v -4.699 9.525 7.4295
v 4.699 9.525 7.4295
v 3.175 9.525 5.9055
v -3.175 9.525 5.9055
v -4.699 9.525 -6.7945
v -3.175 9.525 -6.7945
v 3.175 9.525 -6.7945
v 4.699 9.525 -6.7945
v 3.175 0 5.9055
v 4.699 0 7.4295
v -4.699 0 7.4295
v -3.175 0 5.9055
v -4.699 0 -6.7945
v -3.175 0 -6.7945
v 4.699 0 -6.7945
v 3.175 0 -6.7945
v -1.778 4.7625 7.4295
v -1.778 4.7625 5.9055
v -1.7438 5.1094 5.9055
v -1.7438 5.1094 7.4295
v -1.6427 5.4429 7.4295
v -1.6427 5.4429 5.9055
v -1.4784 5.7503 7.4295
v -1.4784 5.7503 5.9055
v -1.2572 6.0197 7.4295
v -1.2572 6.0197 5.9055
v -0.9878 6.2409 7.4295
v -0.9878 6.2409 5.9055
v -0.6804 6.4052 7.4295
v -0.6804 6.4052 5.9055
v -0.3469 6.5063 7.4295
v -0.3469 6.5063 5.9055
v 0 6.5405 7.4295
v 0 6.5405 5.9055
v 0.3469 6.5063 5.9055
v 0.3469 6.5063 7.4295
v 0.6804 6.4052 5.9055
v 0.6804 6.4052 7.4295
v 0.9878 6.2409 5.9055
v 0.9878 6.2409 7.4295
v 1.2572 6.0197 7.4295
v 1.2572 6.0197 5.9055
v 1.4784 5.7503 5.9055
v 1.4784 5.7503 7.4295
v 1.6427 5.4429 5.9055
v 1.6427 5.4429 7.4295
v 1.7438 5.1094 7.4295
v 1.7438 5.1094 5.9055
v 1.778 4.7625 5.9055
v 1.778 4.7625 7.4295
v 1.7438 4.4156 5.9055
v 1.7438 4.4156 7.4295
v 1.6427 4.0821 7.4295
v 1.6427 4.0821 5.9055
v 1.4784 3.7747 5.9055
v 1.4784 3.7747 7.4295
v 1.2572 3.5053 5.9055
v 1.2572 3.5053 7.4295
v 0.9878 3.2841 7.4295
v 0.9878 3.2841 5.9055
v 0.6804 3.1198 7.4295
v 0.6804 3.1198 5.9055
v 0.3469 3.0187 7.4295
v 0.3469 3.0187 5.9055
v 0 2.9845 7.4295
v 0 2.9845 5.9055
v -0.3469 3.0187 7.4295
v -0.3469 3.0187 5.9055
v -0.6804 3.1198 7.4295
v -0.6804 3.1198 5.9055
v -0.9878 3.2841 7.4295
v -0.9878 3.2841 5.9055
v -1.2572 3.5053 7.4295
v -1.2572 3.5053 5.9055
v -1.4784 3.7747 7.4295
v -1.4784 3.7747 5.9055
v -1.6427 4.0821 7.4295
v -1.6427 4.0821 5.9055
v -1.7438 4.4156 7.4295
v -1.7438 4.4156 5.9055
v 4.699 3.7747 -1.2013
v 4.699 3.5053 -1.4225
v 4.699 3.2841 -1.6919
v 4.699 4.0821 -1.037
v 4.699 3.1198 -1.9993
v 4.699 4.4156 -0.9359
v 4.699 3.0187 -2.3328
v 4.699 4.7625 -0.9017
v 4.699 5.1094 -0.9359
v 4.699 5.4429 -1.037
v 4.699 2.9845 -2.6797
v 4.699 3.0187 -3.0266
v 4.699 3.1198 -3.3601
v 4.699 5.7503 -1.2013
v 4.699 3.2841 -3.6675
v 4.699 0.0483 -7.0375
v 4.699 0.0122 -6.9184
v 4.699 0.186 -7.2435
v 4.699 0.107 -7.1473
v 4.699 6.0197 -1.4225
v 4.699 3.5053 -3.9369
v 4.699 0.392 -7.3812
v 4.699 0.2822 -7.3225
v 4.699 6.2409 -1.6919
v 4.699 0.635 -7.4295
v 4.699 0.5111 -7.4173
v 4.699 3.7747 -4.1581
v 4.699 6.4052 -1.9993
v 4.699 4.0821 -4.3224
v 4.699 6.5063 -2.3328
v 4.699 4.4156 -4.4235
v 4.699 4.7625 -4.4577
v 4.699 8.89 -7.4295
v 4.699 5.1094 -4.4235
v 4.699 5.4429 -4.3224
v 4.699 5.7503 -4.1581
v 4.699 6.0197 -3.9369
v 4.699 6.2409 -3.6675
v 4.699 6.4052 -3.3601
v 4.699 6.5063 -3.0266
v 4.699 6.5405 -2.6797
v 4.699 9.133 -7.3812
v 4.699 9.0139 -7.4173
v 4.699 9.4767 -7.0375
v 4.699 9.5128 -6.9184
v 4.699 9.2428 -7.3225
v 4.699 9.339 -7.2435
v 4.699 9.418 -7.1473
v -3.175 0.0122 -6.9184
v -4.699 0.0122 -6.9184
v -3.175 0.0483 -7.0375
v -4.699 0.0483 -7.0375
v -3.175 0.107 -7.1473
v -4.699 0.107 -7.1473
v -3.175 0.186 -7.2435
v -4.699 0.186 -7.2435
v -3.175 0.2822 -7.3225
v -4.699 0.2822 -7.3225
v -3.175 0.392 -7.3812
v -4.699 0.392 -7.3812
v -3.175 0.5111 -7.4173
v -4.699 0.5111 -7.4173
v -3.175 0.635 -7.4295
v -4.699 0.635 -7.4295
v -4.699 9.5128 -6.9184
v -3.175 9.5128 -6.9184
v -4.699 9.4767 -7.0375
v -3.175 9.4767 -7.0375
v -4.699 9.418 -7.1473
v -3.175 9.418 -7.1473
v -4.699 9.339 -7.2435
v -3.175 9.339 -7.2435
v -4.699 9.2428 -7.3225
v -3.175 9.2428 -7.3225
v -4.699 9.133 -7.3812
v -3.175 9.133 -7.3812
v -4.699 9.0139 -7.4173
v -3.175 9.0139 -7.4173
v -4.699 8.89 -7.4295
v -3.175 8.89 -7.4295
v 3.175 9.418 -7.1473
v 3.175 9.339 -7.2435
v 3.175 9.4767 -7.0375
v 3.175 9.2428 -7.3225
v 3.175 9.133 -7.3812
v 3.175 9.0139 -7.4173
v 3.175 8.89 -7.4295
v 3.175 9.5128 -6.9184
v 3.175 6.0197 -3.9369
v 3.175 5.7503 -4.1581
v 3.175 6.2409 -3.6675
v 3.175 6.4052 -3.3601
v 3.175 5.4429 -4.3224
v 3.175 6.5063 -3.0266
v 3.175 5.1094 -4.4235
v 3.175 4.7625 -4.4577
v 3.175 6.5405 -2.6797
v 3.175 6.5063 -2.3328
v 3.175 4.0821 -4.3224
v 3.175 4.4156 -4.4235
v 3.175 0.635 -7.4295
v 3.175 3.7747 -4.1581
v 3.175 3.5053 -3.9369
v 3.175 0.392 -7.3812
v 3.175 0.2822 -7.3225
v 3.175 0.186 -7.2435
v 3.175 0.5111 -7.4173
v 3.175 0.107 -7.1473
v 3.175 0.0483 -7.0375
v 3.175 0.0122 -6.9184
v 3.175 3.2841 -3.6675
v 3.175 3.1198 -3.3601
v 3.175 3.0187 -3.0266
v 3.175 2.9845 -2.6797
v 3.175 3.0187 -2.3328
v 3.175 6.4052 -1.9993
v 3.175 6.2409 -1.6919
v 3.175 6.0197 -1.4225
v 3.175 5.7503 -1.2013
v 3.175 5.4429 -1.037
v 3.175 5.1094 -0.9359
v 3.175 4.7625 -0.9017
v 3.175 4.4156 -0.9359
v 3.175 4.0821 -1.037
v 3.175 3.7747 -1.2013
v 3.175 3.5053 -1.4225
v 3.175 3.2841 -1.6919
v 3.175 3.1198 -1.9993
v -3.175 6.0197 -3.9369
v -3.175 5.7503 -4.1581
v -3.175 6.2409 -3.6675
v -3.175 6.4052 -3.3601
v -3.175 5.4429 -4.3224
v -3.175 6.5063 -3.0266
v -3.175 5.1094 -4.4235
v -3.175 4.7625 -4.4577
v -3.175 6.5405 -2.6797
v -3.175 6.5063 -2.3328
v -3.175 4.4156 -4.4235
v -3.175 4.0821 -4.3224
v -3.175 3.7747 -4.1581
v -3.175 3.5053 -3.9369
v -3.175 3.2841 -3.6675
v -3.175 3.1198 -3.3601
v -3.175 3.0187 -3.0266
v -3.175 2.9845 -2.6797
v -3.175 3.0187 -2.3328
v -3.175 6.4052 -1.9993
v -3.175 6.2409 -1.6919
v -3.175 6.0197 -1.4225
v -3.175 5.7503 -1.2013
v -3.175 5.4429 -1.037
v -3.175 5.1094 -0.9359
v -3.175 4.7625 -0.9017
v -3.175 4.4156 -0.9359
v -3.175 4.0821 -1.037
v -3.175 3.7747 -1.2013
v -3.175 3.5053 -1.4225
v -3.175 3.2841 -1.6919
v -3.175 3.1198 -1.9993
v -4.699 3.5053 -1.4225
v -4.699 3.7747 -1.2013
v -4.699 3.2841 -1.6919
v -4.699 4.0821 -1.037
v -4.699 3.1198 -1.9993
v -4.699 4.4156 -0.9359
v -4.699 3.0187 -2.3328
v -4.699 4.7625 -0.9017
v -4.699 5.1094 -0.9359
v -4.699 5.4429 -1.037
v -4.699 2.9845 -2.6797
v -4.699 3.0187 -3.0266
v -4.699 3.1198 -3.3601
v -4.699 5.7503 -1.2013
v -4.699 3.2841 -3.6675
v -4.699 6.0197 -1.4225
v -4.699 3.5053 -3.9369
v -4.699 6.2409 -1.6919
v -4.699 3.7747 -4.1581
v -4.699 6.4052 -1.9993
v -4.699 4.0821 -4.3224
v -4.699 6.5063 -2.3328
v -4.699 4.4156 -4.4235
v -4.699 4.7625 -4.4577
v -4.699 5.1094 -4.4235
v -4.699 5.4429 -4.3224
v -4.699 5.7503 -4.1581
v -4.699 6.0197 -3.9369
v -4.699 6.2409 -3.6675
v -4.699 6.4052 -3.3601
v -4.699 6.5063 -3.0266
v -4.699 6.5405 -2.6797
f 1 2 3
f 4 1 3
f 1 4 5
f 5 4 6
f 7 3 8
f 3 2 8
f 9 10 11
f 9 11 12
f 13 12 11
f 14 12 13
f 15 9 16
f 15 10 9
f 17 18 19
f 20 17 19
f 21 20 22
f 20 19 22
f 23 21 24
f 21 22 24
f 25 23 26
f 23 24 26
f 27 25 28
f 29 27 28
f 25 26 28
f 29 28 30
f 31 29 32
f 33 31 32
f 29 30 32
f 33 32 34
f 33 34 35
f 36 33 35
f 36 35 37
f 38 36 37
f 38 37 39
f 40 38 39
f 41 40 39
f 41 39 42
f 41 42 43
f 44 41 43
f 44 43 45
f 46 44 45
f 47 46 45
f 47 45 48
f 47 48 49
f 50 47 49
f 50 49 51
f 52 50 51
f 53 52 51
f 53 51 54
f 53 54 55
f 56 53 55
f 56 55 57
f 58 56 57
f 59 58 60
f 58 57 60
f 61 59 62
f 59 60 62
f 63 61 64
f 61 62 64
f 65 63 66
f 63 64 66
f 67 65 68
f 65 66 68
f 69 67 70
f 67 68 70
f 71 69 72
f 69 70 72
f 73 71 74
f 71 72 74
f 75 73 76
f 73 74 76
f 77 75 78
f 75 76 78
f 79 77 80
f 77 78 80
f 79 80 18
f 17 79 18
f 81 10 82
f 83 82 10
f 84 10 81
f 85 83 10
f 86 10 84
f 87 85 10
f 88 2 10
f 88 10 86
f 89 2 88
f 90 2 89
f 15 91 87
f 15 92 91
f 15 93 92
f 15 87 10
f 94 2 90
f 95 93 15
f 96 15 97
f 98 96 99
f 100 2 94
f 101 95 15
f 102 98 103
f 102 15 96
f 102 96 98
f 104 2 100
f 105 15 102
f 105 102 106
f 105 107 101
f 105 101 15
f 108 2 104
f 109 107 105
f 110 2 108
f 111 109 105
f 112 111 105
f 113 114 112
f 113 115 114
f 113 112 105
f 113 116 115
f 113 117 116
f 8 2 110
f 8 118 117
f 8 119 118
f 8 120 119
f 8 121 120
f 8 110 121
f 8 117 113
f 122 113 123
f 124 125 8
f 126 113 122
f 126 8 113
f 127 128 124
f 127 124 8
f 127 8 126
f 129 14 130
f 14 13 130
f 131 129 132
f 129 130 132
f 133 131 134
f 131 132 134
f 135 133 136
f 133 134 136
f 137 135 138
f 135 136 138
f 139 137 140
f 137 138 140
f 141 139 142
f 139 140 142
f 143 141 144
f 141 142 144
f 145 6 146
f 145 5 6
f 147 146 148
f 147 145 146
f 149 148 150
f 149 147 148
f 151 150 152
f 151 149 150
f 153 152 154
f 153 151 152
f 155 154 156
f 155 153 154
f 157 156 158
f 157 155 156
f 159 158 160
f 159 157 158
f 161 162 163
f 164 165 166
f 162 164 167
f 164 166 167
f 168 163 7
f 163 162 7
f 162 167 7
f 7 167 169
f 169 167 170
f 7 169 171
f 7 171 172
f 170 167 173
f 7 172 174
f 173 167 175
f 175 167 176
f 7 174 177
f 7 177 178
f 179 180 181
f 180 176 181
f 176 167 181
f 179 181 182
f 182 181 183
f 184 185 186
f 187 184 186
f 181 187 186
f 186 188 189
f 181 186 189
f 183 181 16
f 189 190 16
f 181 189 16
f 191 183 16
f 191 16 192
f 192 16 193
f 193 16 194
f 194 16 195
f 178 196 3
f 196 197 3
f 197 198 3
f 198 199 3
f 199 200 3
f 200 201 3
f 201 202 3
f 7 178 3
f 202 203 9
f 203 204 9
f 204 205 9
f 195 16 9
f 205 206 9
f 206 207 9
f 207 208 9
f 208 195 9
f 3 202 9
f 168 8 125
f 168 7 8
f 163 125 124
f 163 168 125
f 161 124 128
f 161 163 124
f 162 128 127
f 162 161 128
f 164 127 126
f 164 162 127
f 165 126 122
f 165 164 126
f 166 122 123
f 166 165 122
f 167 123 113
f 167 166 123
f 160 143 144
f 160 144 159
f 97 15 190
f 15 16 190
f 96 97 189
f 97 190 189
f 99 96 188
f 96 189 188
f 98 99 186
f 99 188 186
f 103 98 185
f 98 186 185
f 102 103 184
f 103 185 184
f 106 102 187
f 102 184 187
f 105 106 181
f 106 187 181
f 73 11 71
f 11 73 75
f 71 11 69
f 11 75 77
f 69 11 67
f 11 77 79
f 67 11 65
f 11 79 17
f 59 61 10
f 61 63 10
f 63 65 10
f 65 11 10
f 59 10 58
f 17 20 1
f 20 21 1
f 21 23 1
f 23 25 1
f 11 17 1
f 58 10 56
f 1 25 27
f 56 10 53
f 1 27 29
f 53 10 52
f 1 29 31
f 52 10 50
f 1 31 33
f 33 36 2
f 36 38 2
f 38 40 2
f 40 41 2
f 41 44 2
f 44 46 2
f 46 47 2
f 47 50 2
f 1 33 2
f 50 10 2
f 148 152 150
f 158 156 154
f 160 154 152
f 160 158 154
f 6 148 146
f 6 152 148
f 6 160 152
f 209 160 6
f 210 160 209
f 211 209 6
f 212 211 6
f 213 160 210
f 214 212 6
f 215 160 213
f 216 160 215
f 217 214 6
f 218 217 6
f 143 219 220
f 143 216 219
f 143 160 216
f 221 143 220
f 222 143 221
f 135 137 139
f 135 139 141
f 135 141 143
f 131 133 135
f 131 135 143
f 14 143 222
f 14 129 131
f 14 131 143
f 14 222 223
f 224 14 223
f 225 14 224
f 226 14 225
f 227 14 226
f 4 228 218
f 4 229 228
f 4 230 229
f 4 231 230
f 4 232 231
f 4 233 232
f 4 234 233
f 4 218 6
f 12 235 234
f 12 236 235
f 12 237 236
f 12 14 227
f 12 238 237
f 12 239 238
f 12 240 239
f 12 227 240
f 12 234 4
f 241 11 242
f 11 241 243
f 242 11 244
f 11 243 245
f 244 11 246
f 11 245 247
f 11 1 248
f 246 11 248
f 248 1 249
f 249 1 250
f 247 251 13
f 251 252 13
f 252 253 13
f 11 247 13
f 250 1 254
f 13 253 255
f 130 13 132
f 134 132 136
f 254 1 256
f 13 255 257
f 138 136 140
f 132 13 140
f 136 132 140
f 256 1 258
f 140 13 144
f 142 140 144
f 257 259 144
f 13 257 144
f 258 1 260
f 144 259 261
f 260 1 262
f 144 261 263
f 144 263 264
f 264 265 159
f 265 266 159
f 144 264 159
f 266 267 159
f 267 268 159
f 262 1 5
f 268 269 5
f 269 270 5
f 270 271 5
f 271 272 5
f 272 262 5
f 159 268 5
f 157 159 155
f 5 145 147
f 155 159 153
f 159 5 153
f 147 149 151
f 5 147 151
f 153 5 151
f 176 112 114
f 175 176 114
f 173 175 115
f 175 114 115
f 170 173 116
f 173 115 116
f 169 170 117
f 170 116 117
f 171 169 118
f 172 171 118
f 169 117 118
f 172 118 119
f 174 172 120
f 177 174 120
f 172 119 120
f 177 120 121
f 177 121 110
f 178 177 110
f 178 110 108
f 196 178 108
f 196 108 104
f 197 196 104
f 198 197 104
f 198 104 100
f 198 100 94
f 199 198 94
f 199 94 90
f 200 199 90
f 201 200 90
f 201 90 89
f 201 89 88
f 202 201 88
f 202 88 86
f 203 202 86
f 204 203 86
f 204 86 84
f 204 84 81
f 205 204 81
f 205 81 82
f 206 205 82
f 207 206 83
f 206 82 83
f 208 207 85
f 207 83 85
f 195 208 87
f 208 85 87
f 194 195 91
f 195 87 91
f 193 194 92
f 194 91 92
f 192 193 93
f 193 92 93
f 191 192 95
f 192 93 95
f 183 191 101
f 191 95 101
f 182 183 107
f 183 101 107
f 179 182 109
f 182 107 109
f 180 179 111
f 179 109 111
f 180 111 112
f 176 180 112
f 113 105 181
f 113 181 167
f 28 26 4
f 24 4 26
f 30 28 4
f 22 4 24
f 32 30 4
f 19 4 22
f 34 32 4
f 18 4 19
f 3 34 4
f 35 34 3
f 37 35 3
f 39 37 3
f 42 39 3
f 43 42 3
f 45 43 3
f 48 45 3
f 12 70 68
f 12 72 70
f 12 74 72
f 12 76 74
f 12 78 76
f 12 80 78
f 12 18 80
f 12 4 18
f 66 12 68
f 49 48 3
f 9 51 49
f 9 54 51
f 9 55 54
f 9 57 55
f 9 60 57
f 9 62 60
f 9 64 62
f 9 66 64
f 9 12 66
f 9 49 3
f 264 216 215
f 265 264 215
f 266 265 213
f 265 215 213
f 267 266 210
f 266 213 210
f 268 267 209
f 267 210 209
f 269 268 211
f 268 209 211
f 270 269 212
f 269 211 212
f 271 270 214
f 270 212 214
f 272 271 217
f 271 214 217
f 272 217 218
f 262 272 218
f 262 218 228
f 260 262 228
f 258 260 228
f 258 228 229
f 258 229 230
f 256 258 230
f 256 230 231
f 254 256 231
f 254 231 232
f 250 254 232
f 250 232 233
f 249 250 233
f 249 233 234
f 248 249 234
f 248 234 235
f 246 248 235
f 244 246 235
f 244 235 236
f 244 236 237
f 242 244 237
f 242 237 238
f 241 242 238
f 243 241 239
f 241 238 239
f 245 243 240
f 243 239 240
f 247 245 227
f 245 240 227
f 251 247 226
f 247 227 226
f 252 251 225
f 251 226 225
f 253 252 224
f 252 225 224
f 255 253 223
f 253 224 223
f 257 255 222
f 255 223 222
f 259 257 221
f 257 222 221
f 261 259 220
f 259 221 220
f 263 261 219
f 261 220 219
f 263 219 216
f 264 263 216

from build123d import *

# Parameters (mm, degrees)
SKETCH1_W                 = 14.859
SKETCH1_H                 = 9.525
BOSS_EXTRUDE1_DEPTH       = 9.398
SKETCH2_W                 = 6.35
SKETCH2_H                 = 13.335
CUT_EXTRUDE1_DEPTH        = 13.961623982
F_5_CLEARANCE_HOLE1_D     = 3.556
F_5_CLEARANCE_HOLE1_DEPTH = 1.524
F_5_CLEARANCE_HOLE2_D     = 3.556
F_5_CLEARANCE_HOLE2_DEPTH = 14.859
F_5_CLEARANCE_HOLE3_D     = 3.556
FILLET1_R                 = 0.635


with BuildPart() as part:
    # Sketch1 → Boss-Extrude1 (new body)
    with BuildSketch(Plane(origin=(4.699, 0, 0), x_dir=(0, 0, -1), z_dir=(1, 0, 0))):
        with Locations((0, 4.7625)):
            Rectangle(SKETCH1_W, SKETCH1_H)
    extrude(amount=-BOSS_EXTRUDE1_DEPTH)

    # Sketch2 → Cut-Extrude1 (cut, through all)
    with BuildSketch(Plane.XZ):
        with Locations((0, -0.762)):
            Rectangle(SKETCH2_W, SKETCH2_H)
    extrude(amount=-CUT_EXTRUDE1_DEPTH, mode=Mode.SUBTRACT)

    # #5 Clearance Hole1
    with Locations(Plane.ZY.offset(4.699)):
        with Locations((-2.6797, 4.7625)):
            Hole(F_5_CLEARANCE_HOLE1_D / 2, depth=F_5_CLEARANCE_HOLE1_DEPTH)

    # #5 Clearance Hole2
    with Locations(Plane.XY.offset(7.4295)):
        with Locations((0, 4.7625)):
            Hole(F_5_CLEARANCE_HOLE2_D / 2, depth=F_5_CLEARANCE_HOLE2_DEPTH)

    # #5 Clearance Hole3 (through all)
    with Locations(Plane.ZY.offset(-3.175)):
        with Locations((-2.6797, 4.7625)):
            Hole(F_5_CLEARANCE_HOLE3_D / 2)

    # Fillet1
    fillet1_edges = [part.edges().sort_by_distance(p)[0] for p in [
        (3.937, 0, -7.4295),
        (3.937, 9.525, -7.4295),
        (-3.937, 9.525, -7.4295),
        (-3.937, 0, -7.4295),
    ]]
    fillet(fillet1_edges, radius=FILLET1_R)


solid = part.part
